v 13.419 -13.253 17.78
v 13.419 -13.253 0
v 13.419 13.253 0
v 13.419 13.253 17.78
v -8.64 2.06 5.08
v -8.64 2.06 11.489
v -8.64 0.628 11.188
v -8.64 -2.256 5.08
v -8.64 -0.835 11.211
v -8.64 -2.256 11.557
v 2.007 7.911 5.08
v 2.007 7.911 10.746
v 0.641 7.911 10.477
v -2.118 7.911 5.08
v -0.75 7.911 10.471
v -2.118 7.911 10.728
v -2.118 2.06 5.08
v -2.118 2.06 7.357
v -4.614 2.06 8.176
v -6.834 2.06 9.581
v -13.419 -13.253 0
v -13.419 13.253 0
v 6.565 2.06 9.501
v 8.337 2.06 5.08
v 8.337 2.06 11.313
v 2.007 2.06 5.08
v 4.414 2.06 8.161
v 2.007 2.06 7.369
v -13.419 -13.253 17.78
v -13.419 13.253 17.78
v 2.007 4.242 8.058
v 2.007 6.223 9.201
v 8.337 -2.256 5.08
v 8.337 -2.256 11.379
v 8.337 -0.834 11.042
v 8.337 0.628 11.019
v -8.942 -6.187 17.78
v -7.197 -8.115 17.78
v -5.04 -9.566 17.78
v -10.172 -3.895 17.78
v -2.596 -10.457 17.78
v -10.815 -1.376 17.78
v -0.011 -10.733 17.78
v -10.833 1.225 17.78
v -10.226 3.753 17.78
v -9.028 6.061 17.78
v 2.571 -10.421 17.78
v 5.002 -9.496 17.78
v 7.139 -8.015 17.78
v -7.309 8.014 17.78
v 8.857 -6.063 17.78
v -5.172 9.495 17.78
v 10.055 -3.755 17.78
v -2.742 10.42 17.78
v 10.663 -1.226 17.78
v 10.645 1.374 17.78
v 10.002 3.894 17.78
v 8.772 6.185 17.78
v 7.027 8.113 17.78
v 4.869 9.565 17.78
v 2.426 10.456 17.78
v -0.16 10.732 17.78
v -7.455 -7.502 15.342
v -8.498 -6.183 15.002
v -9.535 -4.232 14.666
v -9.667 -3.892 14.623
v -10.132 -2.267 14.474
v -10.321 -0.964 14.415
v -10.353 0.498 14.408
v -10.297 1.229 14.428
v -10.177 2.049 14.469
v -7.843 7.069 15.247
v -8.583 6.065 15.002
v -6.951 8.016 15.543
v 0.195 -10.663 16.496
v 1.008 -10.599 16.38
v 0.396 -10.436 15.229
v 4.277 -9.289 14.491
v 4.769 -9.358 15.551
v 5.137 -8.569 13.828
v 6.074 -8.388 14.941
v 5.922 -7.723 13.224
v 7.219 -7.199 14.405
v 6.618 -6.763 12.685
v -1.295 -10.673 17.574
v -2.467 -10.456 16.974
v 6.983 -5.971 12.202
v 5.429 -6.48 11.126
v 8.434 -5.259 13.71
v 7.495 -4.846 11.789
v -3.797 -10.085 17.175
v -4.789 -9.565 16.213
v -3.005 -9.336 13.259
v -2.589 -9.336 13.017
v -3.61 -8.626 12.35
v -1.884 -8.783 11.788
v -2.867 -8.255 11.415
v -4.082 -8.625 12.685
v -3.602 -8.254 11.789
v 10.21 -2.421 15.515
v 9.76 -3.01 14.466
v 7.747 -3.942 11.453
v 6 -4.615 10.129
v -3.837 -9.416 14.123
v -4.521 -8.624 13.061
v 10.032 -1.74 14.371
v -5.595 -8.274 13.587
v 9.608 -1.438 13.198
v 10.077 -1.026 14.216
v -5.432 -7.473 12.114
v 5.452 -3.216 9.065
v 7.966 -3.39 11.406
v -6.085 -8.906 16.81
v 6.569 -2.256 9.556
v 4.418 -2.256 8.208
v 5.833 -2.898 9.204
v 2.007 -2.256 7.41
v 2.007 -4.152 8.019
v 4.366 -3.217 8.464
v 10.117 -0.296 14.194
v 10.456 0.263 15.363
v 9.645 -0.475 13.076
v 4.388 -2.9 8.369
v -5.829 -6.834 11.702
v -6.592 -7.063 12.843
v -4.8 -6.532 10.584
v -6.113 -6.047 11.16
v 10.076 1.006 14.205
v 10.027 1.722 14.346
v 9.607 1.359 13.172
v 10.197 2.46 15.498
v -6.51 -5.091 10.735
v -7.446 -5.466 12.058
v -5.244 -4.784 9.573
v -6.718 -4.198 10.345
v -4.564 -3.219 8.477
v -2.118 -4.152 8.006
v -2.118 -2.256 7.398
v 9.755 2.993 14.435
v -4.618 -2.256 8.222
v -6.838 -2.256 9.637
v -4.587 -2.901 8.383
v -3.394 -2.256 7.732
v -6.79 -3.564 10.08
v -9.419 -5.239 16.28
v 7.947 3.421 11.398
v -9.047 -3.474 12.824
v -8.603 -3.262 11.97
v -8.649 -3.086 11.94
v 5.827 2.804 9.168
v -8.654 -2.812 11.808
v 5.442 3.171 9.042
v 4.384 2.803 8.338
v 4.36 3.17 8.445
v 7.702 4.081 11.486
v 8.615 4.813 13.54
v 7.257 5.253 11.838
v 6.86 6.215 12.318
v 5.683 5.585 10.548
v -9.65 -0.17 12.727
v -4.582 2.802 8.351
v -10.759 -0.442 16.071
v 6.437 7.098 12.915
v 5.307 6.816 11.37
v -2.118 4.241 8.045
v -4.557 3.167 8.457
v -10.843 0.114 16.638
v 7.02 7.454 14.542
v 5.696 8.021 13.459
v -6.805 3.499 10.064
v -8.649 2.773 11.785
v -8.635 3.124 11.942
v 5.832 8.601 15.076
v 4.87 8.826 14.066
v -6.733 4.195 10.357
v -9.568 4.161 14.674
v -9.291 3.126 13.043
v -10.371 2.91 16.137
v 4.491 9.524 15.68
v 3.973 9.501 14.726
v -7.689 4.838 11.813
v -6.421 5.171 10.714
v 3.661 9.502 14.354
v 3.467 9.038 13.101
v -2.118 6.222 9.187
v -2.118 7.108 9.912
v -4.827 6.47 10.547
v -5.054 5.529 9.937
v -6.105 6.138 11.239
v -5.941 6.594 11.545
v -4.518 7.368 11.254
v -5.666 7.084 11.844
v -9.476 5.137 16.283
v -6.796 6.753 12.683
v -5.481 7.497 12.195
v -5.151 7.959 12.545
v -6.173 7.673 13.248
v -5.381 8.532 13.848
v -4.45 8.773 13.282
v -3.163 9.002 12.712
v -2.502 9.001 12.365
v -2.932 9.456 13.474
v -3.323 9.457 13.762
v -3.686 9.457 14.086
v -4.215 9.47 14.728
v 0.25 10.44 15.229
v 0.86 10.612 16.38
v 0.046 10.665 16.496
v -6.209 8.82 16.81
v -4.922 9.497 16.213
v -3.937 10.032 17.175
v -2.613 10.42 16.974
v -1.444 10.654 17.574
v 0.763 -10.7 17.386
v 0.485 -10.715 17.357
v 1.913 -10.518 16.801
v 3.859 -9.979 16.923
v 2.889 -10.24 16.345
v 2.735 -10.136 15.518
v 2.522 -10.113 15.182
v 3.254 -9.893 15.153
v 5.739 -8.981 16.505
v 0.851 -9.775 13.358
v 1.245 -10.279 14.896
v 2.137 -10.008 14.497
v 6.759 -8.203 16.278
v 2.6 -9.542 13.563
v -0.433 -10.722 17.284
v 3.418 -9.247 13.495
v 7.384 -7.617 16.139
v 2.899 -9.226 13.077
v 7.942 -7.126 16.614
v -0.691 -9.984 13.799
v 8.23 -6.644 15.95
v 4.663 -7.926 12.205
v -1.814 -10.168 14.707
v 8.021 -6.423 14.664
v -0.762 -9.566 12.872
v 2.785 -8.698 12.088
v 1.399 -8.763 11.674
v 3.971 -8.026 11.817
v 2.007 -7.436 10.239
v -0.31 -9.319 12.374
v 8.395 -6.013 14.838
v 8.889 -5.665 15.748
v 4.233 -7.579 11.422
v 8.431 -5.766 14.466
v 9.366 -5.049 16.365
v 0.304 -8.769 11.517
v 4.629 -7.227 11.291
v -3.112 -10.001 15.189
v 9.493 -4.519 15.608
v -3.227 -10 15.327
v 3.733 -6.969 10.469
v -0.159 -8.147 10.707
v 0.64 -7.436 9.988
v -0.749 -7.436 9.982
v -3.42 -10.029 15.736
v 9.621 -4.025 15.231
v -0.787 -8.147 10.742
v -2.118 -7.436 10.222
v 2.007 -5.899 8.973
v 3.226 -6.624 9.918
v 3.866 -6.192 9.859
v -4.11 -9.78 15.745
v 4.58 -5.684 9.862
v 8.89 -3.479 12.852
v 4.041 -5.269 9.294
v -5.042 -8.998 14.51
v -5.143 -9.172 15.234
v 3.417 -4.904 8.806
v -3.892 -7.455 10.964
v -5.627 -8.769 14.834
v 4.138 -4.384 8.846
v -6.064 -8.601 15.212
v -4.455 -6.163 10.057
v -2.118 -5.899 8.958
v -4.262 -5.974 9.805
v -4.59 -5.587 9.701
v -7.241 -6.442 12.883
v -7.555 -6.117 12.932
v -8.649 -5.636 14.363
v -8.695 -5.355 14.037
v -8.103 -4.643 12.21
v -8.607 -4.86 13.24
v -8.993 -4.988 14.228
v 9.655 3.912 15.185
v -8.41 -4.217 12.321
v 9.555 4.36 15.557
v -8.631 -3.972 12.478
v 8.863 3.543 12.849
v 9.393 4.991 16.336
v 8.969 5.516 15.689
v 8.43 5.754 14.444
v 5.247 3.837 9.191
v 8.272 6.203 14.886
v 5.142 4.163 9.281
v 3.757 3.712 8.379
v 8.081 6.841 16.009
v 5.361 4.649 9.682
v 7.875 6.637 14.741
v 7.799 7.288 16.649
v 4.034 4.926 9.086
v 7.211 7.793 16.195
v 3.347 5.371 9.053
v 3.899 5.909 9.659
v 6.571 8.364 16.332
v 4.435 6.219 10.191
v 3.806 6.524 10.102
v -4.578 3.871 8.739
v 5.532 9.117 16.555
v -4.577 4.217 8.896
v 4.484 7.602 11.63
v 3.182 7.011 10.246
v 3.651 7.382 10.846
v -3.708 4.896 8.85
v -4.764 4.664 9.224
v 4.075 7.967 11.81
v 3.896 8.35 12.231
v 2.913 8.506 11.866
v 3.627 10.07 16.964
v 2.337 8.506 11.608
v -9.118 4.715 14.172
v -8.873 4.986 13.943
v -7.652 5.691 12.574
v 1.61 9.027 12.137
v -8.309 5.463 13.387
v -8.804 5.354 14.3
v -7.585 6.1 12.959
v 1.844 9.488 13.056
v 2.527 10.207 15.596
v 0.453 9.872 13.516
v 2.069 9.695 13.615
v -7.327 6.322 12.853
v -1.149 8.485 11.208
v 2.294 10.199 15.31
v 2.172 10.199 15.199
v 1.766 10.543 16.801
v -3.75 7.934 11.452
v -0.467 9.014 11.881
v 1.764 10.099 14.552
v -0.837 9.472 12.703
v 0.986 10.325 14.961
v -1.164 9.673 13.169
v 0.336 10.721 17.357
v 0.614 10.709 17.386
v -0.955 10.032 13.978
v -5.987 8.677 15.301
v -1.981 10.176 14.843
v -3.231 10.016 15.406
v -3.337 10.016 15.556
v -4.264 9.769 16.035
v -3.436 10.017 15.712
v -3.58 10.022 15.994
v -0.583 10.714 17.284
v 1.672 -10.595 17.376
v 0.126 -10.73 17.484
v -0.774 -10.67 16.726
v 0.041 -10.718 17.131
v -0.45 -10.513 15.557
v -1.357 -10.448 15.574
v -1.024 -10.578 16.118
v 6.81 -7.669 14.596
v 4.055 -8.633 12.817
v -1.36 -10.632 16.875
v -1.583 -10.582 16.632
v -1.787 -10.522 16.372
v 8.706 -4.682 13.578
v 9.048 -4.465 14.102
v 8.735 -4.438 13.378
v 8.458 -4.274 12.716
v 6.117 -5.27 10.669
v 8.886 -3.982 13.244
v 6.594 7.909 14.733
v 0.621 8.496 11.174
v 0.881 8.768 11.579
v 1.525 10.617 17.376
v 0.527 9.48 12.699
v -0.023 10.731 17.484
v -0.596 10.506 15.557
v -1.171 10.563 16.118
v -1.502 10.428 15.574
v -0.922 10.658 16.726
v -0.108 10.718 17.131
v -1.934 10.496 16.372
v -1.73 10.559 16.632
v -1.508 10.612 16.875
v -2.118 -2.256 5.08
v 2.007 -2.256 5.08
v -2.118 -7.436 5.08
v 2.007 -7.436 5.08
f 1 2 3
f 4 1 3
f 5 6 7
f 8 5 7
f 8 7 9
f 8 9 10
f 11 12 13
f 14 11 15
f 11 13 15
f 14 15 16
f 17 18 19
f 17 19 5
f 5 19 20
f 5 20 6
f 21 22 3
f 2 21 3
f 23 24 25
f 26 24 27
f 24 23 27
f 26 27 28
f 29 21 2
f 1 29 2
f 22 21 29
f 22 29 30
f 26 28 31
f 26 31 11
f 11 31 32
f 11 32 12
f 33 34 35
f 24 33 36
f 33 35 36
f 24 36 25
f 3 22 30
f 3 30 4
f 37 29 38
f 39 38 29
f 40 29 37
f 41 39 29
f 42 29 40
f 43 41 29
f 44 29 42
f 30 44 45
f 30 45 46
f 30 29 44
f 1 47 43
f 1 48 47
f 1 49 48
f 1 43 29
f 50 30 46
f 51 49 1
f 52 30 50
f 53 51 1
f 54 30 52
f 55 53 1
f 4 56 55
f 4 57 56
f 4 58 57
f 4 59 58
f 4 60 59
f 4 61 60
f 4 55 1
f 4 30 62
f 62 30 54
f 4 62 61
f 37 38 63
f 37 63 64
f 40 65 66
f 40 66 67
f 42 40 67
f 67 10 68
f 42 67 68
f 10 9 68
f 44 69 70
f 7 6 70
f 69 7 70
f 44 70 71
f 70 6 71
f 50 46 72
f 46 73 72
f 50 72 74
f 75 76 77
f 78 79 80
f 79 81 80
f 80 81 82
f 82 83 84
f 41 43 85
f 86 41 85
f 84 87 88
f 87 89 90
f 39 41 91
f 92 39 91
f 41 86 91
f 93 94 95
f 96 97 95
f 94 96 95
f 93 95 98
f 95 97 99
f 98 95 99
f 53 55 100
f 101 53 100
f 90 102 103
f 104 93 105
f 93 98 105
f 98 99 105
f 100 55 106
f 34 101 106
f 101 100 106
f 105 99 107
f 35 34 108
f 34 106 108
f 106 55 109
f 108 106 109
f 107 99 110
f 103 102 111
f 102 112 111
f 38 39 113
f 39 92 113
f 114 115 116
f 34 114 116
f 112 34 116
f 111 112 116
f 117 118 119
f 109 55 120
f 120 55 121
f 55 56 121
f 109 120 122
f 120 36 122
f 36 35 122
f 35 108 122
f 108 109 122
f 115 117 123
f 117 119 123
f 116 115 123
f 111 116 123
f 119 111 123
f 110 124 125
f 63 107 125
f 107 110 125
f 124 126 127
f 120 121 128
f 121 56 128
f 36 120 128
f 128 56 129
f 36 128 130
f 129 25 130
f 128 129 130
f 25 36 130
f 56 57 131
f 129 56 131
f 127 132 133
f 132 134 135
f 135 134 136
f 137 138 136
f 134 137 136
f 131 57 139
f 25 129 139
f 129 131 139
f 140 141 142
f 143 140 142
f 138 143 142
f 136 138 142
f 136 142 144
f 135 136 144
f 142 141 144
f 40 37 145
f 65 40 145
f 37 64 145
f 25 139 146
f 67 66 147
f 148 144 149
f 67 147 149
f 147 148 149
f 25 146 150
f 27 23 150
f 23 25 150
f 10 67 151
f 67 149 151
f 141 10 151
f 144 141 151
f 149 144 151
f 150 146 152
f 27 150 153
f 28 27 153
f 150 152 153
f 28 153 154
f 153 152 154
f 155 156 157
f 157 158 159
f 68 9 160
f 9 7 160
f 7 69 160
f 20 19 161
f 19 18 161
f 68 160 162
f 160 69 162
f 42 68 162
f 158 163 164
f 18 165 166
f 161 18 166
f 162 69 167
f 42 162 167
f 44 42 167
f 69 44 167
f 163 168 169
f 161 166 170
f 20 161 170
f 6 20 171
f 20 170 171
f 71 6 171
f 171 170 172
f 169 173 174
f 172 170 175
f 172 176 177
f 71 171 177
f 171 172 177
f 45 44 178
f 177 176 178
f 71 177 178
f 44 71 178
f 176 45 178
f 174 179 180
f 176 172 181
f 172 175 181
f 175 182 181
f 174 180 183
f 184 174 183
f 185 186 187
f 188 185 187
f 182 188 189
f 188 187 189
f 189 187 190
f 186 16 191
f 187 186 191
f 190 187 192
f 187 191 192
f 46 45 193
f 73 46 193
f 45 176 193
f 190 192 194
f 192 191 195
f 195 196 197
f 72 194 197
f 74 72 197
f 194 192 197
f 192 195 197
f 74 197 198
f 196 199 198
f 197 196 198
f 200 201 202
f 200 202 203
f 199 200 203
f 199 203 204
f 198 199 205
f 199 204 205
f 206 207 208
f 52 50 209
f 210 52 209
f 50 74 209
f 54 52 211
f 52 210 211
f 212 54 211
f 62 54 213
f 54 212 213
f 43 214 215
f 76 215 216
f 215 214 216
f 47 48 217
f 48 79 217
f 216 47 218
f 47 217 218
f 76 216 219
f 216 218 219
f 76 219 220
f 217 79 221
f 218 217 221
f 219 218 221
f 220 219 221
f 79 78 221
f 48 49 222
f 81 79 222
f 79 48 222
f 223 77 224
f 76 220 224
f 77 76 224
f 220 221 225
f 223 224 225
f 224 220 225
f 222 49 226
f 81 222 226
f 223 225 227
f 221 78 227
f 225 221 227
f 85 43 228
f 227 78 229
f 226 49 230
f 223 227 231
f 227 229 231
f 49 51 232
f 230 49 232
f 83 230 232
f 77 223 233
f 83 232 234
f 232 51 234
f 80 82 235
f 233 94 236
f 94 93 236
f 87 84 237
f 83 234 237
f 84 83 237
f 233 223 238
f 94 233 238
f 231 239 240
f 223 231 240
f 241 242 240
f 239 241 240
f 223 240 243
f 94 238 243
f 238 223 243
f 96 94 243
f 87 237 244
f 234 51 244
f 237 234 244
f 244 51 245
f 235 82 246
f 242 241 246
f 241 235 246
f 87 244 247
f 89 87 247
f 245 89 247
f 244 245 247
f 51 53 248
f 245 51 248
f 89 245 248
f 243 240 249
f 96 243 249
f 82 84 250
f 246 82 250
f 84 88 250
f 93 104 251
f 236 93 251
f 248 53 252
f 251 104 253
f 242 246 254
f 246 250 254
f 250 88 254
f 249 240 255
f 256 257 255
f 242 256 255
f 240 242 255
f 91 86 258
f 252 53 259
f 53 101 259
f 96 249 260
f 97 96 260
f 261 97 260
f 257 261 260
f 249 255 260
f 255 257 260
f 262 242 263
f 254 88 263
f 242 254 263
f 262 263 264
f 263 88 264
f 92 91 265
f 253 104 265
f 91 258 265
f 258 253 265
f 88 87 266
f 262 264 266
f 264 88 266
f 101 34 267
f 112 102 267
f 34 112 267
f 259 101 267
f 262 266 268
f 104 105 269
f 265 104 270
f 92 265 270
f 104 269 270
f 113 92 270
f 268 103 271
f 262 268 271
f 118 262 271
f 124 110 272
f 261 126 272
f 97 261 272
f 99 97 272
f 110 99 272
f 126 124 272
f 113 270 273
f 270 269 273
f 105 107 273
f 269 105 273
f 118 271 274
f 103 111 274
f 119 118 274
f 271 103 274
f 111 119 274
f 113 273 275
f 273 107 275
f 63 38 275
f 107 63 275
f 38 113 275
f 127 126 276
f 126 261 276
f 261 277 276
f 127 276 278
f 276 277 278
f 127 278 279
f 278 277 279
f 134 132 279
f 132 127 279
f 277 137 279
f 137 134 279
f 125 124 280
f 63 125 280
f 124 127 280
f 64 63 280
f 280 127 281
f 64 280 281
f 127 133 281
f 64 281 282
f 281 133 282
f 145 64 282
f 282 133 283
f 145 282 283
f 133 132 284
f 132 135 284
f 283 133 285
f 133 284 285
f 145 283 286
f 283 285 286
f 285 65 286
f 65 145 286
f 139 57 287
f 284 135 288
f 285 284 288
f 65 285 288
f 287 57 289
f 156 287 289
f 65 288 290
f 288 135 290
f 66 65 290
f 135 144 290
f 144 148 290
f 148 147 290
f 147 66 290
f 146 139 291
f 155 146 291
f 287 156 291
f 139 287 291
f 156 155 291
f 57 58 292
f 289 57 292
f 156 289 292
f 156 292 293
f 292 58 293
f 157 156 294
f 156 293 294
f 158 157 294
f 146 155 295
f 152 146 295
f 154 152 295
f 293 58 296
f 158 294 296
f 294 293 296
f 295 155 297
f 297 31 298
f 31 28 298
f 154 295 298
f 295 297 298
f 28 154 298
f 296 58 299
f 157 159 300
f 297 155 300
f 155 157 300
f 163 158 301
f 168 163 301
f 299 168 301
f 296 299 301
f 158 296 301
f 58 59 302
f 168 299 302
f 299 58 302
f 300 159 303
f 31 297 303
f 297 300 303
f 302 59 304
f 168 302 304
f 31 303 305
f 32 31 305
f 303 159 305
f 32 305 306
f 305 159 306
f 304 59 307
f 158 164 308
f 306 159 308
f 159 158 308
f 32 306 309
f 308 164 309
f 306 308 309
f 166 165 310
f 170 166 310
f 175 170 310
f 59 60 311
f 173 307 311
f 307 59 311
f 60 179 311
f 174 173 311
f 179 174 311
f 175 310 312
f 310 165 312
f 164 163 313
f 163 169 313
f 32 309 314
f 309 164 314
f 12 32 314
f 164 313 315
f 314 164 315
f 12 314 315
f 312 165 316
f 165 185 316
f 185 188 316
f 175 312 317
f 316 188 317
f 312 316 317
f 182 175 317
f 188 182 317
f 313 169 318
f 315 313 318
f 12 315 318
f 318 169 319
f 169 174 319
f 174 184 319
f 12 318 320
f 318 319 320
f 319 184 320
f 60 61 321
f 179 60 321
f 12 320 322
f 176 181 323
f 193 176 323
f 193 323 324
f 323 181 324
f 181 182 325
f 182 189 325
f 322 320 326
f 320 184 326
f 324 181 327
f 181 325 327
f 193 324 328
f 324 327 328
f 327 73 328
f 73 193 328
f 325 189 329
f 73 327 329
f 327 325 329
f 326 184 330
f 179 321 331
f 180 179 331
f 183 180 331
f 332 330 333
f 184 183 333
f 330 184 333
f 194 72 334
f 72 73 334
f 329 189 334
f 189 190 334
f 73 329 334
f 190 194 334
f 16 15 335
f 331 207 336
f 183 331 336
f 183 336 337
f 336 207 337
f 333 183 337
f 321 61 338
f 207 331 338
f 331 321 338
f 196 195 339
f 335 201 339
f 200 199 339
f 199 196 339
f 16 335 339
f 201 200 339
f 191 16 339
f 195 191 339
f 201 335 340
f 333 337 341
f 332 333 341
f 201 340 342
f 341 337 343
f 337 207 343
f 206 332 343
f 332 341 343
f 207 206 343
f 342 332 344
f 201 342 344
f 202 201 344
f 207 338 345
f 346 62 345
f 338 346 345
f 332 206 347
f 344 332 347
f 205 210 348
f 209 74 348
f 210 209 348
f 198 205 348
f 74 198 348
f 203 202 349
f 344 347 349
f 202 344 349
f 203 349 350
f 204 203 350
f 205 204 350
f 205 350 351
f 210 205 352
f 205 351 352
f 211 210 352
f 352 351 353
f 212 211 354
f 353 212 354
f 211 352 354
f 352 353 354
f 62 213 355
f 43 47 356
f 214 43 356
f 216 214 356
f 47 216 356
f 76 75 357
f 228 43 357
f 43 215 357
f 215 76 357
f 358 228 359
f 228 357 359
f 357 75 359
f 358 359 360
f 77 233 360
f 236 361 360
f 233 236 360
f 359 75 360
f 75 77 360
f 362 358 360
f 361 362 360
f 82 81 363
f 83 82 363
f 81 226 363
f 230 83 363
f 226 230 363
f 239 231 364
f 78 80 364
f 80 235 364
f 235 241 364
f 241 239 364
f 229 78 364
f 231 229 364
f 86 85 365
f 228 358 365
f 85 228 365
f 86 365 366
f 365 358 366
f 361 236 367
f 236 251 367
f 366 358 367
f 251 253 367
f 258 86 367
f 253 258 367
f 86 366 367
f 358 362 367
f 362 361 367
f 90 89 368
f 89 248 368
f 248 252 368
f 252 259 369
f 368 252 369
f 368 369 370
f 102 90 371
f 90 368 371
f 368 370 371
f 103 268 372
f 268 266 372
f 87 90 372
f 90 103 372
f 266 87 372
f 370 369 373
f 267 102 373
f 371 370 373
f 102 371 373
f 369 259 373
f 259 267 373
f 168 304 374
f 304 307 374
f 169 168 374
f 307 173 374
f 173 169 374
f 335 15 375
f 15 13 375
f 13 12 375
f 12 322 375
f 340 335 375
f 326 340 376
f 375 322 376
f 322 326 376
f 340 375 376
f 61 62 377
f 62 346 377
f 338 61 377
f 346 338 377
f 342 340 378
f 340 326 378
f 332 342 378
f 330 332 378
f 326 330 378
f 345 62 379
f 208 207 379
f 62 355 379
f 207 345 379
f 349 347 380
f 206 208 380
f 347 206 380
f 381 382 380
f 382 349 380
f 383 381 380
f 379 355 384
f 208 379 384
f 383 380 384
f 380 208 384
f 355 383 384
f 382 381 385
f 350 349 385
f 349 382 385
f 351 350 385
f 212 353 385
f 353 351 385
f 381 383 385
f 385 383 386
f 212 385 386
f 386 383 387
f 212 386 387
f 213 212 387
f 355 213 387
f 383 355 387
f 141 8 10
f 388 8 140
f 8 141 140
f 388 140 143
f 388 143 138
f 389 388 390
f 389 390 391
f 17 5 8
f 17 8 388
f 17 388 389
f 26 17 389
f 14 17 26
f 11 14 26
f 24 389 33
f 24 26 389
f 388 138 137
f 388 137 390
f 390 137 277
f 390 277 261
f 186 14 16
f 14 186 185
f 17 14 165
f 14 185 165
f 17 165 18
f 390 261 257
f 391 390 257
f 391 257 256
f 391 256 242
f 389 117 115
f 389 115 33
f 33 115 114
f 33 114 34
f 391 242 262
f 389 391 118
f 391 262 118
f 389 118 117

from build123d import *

# Parameters (mm, degrees)
F0_W     = 26.8387589604
F0_H     = 26.5057813376
F1_DEPTH = 17.78
F3_ANGLE = 180
F5_DEPTH = 12.7


with BuildPart() as f1:
    # F0 (on Top) → F1 (new body)
    with BuildSketch(Plane.XY):
        Rectangle(F0_W, F0_H)
    extrude(amount=F1_DEPTH)

    # F2 (on face) → F3 (revolve, cut)
    with BuildSketch(Plane.XY.offset(17.78)):
        with BuildLine():
            Line((-0.1599836294, 10.7320307857), (-0.010505857, -10.7332180251))
            ThreePointArc((-0.010505857, -10.7332180251), (10.7329629317, 0.0747412436), (-0.1599836294, 10.7320307857))
        make_face()
    revolve(axis=Axis((-0.0852447432, -0.0005936197, 17.78), (-0.0069635414, 0.9999757543, 0)), revolution_arc=F3_ANGLE, mode=Mode.SUBTRACT)

    # F4 (on face) → F5 (cut)
    with BuildSketch(Plane.XY.offset(17.78)):
        Polygon((2.006725641, 7.910721004), (-0.1403368457, 7.910721004), (-0.0334680846, -7.4358051643), (2.006725641, -7.4358051643), (2.006725641, -2.2563524544), (8.3371670917, -2.2563524544), (8.3371670917, 2.0598582923), (2.006725641, 2.0598582923), align=None)
        Polygon((-0.1403368457, 7.910721004), (-2.1176536102, 7.910721004), (-2.1176536102, 2.0598582923), (-8.6399270222, 2.0598582923), (-8.6399270222, -2.2563524544), (-2.1176536102, -2.2563524544), (-2.1176536102, -7.4358051643), (-0.0334680846, -7.4358051643), align=None)
    extrude(amount=-F5_DEPTH, mode=Mode.SUBTRACT)


solid = f1.part
